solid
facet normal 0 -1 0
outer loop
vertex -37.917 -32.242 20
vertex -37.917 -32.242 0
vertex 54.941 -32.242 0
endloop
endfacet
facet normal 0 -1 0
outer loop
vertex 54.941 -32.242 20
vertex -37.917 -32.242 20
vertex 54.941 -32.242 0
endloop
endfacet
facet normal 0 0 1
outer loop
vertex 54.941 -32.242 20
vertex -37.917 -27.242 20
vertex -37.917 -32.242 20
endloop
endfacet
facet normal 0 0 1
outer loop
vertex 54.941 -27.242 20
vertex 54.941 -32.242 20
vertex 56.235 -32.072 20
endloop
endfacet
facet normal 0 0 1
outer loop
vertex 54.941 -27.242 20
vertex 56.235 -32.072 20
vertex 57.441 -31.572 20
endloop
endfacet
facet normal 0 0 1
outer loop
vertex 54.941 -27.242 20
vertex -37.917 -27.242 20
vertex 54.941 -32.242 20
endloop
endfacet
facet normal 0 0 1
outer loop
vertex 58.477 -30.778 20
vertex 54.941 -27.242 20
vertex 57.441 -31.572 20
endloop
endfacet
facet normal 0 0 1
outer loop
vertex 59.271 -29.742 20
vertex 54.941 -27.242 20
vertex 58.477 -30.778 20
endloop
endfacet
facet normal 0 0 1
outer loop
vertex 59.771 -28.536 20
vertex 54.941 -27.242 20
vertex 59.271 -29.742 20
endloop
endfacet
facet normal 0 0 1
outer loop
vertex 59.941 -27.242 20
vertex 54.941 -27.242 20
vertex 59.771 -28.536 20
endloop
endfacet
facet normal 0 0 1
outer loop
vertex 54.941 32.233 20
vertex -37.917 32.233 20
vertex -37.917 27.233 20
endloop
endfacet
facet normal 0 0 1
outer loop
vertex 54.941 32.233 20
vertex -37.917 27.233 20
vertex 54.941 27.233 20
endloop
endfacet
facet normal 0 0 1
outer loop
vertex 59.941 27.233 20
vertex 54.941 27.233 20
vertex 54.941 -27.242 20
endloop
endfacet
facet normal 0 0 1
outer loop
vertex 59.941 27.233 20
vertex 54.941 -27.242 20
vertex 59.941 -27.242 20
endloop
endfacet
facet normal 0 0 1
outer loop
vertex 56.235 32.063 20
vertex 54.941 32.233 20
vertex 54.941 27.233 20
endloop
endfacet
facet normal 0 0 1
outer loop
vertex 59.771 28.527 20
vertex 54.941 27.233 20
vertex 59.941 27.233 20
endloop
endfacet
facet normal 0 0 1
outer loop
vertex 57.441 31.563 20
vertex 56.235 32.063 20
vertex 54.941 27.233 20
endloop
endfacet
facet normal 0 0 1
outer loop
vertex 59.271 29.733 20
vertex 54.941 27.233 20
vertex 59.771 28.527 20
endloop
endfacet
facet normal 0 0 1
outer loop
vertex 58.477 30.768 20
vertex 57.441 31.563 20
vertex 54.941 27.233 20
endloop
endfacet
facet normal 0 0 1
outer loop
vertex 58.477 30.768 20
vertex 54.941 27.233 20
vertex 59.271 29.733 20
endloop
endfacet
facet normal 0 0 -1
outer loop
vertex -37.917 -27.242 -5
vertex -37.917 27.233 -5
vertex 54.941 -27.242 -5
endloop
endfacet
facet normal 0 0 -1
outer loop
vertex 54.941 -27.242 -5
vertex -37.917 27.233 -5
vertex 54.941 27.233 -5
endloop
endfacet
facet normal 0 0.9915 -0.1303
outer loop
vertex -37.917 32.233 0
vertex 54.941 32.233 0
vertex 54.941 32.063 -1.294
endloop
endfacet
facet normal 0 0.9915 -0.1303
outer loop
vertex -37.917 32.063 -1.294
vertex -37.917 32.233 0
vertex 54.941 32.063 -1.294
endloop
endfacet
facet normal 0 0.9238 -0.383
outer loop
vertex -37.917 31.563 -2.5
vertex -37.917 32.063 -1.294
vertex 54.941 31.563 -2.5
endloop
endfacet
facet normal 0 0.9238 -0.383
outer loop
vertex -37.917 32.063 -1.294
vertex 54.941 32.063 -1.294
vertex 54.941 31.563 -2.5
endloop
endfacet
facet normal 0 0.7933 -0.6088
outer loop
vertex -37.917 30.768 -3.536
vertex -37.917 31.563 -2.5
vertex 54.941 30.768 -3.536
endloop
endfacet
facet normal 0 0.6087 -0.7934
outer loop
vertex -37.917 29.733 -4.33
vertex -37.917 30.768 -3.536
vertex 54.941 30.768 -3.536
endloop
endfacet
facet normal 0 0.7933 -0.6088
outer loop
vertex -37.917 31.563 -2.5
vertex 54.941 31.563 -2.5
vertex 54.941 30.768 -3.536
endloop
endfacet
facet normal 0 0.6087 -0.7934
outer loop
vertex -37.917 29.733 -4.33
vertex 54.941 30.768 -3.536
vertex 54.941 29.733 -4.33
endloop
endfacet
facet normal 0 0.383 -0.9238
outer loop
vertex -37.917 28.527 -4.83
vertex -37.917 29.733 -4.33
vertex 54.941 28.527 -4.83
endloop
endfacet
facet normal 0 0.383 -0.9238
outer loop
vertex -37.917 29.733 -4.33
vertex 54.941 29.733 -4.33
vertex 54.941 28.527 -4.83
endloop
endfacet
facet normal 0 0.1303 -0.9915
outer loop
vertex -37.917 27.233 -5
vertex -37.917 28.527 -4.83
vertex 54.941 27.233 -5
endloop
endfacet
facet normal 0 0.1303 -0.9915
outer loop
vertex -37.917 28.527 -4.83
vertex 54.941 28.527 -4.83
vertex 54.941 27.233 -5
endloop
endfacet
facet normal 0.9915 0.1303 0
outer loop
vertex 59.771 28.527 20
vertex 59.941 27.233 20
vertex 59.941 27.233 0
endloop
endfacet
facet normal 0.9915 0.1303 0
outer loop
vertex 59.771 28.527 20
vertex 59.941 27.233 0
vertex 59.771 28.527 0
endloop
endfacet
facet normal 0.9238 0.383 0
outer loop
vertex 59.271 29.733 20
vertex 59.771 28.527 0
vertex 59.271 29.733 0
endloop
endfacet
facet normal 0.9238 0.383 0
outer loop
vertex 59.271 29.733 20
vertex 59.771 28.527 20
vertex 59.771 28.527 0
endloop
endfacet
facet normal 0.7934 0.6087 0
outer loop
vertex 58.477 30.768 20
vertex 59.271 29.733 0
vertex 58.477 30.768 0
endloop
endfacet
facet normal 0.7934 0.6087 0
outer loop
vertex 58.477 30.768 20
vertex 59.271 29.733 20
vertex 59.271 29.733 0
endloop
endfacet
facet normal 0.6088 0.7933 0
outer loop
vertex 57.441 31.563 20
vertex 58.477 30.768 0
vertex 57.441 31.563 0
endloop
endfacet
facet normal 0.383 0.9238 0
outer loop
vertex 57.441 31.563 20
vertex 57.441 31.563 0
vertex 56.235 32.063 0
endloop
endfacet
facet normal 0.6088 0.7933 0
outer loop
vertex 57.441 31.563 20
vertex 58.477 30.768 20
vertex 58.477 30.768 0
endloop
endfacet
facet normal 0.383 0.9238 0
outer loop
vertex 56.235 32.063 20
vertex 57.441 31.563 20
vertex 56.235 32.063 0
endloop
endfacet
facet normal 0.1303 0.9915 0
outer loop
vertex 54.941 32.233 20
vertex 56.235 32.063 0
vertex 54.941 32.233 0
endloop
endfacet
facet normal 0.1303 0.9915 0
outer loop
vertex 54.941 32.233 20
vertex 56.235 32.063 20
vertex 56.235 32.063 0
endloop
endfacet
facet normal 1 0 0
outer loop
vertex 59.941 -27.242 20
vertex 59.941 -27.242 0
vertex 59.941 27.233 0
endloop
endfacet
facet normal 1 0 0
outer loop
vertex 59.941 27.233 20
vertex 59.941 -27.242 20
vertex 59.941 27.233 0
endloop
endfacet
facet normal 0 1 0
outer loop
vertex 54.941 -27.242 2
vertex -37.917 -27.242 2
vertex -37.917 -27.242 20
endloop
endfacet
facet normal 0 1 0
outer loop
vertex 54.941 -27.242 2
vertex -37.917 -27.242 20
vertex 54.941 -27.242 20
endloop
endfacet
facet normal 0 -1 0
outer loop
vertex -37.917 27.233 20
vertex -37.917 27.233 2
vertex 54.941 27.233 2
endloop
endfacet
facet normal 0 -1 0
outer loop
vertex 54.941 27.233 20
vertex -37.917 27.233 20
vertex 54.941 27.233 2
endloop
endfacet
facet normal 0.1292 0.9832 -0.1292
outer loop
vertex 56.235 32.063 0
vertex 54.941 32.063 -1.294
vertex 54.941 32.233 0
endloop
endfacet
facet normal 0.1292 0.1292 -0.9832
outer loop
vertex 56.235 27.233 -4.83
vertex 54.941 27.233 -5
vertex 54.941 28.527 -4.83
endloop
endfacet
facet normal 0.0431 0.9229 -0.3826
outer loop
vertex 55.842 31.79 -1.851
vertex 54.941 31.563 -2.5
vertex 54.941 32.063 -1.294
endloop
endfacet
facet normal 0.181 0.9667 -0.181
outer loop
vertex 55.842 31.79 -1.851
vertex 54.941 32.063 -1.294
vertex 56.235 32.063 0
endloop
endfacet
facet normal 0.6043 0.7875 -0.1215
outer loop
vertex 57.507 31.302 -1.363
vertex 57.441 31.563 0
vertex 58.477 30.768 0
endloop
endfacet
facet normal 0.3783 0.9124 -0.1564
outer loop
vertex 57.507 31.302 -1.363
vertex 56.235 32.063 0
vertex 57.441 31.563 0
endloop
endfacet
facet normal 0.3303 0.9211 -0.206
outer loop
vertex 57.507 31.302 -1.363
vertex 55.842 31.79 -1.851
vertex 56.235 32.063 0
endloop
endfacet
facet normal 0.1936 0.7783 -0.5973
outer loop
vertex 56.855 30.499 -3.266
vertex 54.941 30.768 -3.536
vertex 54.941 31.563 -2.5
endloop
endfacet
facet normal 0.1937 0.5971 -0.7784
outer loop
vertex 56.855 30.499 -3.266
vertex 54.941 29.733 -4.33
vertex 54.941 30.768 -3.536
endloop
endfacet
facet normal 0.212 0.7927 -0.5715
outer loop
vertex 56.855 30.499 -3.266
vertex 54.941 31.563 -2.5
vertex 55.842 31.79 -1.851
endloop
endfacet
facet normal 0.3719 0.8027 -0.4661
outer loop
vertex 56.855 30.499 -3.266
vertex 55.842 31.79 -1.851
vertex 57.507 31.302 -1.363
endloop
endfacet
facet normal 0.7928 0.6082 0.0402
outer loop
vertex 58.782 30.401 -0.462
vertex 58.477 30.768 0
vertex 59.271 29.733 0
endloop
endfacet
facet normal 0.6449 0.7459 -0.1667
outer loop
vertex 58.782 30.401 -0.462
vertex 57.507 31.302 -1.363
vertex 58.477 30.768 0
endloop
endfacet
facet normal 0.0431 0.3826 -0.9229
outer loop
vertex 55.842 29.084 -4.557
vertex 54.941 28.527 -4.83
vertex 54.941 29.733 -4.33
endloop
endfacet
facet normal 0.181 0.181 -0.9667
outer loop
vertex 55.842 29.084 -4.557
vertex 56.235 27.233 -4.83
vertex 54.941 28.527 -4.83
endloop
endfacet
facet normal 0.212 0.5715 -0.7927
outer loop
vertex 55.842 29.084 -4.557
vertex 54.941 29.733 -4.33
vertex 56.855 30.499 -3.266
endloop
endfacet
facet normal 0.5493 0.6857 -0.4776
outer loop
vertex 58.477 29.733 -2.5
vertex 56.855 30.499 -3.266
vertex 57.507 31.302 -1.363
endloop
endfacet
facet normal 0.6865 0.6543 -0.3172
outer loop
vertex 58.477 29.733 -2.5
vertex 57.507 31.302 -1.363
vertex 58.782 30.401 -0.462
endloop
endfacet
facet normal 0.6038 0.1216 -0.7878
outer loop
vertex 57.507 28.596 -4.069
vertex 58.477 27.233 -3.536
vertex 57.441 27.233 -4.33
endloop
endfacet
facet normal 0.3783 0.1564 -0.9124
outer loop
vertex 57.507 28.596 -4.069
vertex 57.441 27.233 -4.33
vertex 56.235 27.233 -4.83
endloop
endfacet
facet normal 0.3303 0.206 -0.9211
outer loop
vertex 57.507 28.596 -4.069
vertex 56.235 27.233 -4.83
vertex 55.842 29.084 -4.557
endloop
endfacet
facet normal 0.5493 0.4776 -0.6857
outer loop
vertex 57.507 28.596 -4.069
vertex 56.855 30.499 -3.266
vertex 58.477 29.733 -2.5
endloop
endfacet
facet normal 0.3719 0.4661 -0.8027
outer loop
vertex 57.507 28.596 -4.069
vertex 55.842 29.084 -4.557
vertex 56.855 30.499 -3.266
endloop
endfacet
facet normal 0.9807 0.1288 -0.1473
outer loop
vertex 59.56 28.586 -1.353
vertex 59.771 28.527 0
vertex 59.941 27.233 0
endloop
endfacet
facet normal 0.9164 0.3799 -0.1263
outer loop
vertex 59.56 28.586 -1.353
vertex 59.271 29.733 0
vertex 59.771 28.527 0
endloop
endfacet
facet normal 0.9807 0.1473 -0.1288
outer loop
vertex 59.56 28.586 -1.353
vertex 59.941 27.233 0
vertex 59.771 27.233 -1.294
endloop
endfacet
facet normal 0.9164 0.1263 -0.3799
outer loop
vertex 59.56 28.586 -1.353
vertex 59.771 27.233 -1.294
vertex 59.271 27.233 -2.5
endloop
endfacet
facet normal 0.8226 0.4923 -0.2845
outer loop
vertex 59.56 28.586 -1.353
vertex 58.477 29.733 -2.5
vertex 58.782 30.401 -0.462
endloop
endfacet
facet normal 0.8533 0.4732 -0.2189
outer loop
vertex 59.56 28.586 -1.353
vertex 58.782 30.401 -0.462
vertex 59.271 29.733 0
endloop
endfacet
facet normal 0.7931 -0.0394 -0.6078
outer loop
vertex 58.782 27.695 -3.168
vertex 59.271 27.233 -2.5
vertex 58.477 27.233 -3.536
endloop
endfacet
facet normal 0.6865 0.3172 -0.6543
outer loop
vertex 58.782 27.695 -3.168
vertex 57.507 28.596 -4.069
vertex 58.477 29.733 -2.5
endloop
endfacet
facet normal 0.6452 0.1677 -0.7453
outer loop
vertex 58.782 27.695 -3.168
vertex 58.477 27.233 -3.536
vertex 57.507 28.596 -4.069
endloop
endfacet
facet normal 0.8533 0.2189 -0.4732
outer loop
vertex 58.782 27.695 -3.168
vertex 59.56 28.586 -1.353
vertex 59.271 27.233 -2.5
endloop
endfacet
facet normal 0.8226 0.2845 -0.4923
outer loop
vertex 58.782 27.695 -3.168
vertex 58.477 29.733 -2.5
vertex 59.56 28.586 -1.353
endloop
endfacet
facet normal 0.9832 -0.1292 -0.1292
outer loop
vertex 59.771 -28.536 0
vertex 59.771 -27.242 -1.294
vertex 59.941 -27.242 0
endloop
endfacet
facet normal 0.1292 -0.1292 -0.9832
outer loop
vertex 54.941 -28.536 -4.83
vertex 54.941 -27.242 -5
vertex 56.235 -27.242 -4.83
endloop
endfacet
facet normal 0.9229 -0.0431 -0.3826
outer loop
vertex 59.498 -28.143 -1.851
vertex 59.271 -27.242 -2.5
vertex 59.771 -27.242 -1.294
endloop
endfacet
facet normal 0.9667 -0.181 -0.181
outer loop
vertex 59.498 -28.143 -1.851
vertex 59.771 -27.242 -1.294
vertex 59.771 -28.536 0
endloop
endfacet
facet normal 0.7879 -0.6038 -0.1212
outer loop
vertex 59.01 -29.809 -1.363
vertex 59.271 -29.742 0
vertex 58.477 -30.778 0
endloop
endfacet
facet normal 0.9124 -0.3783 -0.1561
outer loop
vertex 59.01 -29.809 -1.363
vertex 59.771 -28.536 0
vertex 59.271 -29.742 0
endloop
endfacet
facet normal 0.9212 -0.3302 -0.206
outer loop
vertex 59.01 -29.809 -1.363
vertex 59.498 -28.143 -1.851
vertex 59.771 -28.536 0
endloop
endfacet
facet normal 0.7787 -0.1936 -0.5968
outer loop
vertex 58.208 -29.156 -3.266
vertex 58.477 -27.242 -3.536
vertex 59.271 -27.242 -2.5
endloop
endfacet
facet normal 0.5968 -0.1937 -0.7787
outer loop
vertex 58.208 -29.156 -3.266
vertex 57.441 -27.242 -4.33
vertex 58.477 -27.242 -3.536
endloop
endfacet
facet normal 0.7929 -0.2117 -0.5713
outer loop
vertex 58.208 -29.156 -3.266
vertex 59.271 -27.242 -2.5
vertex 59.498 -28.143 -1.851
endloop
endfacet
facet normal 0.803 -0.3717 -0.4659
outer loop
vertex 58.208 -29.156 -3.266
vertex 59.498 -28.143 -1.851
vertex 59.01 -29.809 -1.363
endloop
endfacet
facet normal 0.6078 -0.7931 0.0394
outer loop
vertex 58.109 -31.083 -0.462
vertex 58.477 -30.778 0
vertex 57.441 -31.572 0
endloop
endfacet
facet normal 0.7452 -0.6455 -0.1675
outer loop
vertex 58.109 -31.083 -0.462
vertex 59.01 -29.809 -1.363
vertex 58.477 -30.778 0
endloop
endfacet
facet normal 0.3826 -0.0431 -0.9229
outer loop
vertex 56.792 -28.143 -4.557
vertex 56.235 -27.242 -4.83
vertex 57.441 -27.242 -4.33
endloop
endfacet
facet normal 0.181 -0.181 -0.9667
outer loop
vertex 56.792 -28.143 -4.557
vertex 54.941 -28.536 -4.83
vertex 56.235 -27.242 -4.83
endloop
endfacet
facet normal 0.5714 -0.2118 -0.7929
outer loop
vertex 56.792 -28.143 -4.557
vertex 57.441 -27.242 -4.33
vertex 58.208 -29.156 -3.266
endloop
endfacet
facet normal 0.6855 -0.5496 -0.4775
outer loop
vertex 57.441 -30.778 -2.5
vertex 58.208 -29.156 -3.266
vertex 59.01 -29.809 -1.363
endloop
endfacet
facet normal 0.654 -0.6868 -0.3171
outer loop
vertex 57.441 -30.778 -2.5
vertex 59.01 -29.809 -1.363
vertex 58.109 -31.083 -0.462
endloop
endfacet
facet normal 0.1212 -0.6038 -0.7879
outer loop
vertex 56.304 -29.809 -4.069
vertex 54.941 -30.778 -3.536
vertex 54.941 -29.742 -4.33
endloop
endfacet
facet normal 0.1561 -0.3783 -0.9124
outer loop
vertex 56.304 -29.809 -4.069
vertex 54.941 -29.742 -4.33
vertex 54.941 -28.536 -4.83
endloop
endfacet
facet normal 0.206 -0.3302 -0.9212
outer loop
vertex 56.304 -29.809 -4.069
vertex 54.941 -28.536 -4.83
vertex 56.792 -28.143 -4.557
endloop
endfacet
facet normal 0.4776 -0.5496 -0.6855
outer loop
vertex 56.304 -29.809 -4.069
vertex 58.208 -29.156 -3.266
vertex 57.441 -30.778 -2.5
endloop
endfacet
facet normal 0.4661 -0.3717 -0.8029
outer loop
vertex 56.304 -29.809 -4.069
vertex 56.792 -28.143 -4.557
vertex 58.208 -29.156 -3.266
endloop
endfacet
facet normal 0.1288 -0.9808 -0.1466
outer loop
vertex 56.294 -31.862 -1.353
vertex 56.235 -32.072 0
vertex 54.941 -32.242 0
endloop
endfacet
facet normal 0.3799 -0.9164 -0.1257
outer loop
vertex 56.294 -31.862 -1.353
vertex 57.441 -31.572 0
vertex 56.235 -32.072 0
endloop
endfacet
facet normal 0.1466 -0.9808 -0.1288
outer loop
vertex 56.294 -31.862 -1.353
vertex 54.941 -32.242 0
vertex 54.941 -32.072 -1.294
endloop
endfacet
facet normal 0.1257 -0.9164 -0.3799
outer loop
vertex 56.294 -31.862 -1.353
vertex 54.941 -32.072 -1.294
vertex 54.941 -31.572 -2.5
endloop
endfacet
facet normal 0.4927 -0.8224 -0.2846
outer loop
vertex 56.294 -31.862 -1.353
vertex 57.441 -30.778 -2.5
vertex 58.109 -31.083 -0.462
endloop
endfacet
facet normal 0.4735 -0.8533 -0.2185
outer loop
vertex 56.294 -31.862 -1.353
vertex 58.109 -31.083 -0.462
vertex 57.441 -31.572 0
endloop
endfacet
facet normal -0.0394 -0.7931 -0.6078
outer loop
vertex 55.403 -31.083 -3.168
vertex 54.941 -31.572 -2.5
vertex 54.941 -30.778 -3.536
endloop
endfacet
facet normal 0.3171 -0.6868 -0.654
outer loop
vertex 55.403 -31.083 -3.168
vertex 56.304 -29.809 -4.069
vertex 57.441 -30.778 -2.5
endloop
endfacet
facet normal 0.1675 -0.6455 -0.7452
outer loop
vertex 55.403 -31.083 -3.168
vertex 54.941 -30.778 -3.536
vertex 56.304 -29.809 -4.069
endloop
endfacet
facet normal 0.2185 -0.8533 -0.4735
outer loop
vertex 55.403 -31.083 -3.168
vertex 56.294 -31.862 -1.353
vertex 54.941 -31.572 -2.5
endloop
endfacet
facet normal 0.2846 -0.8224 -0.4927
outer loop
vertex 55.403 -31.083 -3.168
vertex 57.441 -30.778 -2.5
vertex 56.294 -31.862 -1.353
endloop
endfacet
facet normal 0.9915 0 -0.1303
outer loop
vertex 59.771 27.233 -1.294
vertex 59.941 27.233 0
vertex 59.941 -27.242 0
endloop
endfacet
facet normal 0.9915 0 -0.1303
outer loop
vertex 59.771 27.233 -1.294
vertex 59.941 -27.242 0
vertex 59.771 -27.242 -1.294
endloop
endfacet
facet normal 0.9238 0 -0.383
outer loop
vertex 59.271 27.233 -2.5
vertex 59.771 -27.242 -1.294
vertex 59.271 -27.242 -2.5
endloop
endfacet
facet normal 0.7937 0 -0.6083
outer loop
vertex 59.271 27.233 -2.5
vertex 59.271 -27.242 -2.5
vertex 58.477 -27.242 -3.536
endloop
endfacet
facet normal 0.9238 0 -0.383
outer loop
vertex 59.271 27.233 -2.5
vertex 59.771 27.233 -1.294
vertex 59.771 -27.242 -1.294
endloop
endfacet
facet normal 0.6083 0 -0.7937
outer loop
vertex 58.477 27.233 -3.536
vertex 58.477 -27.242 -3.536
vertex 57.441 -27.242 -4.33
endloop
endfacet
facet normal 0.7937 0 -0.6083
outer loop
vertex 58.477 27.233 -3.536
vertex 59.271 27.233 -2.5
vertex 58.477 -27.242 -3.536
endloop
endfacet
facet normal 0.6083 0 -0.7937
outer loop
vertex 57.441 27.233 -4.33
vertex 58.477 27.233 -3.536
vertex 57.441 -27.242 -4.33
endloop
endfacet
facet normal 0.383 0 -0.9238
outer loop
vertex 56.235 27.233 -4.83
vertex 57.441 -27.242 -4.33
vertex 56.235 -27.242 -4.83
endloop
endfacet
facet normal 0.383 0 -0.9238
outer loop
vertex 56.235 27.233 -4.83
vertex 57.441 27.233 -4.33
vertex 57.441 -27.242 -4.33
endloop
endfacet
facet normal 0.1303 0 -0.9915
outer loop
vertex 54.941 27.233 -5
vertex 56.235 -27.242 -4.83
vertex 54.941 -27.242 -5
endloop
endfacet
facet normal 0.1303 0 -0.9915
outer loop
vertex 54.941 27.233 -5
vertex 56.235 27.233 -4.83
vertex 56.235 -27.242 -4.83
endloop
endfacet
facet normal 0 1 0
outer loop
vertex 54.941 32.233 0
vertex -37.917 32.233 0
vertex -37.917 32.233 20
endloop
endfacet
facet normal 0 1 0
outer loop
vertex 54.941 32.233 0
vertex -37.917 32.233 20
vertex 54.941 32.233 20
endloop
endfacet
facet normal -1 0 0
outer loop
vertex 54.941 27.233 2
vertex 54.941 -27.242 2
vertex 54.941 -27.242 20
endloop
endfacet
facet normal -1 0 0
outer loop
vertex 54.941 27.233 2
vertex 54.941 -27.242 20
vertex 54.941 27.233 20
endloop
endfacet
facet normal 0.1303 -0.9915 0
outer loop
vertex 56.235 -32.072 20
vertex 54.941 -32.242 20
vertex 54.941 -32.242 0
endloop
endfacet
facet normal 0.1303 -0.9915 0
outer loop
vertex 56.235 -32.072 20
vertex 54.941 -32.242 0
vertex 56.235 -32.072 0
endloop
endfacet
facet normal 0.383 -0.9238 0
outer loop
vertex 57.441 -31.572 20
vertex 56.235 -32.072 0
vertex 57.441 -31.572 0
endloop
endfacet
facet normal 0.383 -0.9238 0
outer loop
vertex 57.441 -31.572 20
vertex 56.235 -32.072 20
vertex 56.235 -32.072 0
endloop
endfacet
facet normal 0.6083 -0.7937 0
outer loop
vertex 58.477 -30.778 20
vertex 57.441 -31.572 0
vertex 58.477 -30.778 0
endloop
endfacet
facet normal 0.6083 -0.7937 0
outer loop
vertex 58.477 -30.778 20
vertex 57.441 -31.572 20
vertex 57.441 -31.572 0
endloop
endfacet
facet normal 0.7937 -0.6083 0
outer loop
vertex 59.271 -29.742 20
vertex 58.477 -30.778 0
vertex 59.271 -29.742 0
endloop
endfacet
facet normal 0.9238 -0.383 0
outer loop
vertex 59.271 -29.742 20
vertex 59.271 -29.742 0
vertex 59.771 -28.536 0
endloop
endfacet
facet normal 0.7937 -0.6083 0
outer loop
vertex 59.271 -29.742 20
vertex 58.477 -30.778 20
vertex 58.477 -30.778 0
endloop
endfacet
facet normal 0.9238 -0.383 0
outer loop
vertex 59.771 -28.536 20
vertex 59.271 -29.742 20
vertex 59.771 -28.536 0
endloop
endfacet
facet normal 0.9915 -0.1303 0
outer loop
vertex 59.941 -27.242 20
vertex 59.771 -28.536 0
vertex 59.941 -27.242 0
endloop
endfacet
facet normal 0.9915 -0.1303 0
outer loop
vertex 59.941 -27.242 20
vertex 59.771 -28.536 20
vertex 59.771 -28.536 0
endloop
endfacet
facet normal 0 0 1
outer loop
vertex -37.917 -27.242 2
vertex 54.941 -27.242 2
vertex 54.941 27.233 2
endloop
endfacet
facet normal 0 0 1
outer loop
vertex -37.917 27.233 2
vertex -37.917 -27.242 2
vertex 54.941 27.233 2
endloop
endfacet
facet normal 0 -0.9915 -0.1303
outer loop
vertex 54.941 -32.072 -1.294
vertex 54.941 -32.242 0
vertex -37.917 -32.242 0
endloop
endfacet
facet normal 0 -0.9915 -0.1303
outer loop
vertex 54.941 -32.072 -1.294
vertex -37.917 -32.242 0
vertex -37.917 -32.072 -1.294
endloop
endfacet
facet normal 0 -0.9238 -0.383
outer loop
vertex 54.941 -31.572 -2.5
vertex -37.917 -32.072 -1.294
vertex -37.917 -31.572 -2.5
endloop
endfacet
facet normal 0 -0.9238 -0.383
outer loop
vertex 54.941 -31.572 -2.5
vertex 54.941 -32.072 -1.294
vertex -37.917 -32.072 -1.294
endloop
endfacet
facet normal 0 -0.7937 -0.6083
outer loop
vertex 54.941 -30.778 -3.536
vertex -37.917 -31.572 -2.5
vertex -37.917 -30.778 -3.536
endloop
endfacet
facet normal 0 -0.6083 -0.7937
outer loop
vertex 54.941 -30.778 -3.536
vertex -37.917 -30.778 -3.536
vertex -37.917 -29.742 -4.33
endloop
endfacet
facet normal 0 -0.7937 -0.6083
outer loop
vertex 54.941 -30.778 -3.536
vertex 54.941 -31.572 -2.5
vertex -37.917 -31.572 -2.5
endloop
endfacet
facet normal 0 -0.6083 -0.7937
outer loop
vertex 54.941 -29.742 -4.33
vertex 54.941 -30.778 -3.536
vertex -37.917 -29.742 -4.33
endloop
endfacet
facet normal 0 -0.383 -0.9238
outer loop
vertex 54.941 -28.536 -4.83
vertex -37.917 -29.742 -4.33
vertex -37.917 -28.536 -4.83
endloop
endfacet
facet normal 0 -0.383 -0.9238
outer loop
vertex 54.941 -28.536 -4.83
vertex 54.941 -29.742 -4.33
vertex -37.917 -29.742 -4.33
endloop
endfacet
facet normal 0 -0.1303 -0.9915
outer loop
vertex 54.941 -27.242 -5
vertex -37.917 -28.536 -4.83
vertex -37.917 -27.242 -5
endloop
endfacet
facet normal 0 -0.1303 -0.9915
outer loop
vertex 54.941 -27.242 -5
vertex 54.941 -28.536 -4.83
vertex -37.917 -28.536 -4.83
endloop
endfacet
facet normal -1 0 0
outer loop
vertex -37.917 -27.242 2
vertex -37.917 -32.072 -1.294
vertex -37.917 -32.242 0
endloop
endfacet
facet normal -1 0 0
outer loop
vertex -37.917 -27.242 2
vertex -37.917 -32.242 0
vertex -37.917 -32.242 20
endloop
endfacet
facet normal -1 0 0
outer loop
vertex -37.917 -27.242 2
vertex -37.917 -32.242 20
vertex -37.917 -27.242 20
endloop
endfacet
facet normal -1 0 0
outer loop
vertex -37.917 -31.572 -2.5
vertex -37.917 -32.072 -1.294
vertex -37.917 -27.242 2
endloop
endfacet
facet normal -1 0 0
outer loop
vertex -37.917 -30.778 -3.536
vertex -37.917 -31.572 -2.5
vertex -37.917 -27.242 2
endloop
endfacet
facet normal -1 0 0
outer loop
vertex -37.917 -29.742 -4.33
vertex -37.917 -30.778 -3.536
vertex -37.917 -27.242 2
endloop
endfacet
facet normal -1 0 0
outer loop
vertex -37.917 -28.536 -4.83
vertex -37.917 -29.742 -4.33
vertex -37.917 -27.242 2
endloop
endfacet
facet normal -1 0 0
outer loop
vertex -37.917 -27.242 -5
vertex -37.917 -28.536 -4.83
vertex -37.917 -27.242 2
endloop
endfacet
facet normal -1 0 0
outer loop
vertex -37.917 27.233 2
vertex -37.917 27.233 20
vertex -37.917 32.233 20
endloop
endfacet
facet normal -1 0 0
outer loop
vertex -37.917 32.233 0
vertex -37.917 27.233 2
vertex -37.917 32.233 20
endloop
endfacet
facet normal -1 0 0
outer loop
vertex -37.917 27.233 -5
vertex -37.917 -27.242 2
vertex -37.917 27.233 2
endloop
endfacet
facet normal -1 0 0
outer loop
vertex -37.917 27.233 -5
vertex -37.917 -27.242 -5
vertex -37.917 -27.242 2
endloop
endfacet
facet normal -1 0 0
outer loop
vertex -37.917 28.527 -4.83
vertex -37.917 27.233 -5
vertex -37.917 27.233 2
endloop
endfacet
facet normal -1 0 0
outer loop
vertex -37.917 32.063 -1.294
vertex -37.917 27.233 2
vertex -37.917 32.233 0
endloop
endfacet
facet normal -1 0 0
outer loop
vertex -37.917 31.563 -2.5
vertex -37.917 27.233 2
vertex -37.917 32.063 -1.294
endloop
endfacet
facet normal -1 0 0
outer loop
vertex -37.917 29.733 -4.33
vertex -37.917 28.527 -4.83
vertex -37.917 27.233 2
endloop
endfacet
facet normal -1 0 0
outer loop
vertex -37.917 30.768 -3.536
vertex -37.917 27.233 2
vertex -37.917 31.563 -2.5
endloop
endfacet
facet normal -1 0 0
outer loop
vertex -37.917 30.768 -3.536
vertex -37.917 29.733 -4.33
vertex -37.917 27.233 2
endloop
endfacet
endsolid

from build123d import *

# Parameters (mm, degrees)
SKETCH_W          = 92.858264
SKETCH_H          = 54.475084
PAD_DEPTH         = 20
THICKNESS_T       = 5
THICKNESS_FACE4_W = 54.475084
THICKNESS_FACE4_H = 92.858264
PAD001_DEPTH      = 2


with BuildPart() as part:
    # Sketch → Pad (new body)
    with BuildSketch(Plane.XY):
        with Locations((8.511961, -0.004594)):
            Rectangle(SKETCH_W, SKETCH_H)
    extrude(amount=PAD_DEPTH)

    # Thickness
    thickness_openings = [part.faces().sort_by_distance(p)[0] for p in [
        (8.511961, -0.004594, 20),
        (-37.917171, -0.004594, 10),
    ]]
    offset(amount=THICKNESS_T, openings=thickness_openings)

    # Thickness Face4 → Pad001 (add)
    with BuildSketch(Plane(origin=(8.511961, -0.004594, 0), x_dir=(0, 1, 0), z_dir=(0, 0, 1))):
        Rectangle(THICKNESS_FACE4_W, THICKNESS_FACE4_H)
    extrude(amount=PAD001_DEPTH)


solid = part.part
